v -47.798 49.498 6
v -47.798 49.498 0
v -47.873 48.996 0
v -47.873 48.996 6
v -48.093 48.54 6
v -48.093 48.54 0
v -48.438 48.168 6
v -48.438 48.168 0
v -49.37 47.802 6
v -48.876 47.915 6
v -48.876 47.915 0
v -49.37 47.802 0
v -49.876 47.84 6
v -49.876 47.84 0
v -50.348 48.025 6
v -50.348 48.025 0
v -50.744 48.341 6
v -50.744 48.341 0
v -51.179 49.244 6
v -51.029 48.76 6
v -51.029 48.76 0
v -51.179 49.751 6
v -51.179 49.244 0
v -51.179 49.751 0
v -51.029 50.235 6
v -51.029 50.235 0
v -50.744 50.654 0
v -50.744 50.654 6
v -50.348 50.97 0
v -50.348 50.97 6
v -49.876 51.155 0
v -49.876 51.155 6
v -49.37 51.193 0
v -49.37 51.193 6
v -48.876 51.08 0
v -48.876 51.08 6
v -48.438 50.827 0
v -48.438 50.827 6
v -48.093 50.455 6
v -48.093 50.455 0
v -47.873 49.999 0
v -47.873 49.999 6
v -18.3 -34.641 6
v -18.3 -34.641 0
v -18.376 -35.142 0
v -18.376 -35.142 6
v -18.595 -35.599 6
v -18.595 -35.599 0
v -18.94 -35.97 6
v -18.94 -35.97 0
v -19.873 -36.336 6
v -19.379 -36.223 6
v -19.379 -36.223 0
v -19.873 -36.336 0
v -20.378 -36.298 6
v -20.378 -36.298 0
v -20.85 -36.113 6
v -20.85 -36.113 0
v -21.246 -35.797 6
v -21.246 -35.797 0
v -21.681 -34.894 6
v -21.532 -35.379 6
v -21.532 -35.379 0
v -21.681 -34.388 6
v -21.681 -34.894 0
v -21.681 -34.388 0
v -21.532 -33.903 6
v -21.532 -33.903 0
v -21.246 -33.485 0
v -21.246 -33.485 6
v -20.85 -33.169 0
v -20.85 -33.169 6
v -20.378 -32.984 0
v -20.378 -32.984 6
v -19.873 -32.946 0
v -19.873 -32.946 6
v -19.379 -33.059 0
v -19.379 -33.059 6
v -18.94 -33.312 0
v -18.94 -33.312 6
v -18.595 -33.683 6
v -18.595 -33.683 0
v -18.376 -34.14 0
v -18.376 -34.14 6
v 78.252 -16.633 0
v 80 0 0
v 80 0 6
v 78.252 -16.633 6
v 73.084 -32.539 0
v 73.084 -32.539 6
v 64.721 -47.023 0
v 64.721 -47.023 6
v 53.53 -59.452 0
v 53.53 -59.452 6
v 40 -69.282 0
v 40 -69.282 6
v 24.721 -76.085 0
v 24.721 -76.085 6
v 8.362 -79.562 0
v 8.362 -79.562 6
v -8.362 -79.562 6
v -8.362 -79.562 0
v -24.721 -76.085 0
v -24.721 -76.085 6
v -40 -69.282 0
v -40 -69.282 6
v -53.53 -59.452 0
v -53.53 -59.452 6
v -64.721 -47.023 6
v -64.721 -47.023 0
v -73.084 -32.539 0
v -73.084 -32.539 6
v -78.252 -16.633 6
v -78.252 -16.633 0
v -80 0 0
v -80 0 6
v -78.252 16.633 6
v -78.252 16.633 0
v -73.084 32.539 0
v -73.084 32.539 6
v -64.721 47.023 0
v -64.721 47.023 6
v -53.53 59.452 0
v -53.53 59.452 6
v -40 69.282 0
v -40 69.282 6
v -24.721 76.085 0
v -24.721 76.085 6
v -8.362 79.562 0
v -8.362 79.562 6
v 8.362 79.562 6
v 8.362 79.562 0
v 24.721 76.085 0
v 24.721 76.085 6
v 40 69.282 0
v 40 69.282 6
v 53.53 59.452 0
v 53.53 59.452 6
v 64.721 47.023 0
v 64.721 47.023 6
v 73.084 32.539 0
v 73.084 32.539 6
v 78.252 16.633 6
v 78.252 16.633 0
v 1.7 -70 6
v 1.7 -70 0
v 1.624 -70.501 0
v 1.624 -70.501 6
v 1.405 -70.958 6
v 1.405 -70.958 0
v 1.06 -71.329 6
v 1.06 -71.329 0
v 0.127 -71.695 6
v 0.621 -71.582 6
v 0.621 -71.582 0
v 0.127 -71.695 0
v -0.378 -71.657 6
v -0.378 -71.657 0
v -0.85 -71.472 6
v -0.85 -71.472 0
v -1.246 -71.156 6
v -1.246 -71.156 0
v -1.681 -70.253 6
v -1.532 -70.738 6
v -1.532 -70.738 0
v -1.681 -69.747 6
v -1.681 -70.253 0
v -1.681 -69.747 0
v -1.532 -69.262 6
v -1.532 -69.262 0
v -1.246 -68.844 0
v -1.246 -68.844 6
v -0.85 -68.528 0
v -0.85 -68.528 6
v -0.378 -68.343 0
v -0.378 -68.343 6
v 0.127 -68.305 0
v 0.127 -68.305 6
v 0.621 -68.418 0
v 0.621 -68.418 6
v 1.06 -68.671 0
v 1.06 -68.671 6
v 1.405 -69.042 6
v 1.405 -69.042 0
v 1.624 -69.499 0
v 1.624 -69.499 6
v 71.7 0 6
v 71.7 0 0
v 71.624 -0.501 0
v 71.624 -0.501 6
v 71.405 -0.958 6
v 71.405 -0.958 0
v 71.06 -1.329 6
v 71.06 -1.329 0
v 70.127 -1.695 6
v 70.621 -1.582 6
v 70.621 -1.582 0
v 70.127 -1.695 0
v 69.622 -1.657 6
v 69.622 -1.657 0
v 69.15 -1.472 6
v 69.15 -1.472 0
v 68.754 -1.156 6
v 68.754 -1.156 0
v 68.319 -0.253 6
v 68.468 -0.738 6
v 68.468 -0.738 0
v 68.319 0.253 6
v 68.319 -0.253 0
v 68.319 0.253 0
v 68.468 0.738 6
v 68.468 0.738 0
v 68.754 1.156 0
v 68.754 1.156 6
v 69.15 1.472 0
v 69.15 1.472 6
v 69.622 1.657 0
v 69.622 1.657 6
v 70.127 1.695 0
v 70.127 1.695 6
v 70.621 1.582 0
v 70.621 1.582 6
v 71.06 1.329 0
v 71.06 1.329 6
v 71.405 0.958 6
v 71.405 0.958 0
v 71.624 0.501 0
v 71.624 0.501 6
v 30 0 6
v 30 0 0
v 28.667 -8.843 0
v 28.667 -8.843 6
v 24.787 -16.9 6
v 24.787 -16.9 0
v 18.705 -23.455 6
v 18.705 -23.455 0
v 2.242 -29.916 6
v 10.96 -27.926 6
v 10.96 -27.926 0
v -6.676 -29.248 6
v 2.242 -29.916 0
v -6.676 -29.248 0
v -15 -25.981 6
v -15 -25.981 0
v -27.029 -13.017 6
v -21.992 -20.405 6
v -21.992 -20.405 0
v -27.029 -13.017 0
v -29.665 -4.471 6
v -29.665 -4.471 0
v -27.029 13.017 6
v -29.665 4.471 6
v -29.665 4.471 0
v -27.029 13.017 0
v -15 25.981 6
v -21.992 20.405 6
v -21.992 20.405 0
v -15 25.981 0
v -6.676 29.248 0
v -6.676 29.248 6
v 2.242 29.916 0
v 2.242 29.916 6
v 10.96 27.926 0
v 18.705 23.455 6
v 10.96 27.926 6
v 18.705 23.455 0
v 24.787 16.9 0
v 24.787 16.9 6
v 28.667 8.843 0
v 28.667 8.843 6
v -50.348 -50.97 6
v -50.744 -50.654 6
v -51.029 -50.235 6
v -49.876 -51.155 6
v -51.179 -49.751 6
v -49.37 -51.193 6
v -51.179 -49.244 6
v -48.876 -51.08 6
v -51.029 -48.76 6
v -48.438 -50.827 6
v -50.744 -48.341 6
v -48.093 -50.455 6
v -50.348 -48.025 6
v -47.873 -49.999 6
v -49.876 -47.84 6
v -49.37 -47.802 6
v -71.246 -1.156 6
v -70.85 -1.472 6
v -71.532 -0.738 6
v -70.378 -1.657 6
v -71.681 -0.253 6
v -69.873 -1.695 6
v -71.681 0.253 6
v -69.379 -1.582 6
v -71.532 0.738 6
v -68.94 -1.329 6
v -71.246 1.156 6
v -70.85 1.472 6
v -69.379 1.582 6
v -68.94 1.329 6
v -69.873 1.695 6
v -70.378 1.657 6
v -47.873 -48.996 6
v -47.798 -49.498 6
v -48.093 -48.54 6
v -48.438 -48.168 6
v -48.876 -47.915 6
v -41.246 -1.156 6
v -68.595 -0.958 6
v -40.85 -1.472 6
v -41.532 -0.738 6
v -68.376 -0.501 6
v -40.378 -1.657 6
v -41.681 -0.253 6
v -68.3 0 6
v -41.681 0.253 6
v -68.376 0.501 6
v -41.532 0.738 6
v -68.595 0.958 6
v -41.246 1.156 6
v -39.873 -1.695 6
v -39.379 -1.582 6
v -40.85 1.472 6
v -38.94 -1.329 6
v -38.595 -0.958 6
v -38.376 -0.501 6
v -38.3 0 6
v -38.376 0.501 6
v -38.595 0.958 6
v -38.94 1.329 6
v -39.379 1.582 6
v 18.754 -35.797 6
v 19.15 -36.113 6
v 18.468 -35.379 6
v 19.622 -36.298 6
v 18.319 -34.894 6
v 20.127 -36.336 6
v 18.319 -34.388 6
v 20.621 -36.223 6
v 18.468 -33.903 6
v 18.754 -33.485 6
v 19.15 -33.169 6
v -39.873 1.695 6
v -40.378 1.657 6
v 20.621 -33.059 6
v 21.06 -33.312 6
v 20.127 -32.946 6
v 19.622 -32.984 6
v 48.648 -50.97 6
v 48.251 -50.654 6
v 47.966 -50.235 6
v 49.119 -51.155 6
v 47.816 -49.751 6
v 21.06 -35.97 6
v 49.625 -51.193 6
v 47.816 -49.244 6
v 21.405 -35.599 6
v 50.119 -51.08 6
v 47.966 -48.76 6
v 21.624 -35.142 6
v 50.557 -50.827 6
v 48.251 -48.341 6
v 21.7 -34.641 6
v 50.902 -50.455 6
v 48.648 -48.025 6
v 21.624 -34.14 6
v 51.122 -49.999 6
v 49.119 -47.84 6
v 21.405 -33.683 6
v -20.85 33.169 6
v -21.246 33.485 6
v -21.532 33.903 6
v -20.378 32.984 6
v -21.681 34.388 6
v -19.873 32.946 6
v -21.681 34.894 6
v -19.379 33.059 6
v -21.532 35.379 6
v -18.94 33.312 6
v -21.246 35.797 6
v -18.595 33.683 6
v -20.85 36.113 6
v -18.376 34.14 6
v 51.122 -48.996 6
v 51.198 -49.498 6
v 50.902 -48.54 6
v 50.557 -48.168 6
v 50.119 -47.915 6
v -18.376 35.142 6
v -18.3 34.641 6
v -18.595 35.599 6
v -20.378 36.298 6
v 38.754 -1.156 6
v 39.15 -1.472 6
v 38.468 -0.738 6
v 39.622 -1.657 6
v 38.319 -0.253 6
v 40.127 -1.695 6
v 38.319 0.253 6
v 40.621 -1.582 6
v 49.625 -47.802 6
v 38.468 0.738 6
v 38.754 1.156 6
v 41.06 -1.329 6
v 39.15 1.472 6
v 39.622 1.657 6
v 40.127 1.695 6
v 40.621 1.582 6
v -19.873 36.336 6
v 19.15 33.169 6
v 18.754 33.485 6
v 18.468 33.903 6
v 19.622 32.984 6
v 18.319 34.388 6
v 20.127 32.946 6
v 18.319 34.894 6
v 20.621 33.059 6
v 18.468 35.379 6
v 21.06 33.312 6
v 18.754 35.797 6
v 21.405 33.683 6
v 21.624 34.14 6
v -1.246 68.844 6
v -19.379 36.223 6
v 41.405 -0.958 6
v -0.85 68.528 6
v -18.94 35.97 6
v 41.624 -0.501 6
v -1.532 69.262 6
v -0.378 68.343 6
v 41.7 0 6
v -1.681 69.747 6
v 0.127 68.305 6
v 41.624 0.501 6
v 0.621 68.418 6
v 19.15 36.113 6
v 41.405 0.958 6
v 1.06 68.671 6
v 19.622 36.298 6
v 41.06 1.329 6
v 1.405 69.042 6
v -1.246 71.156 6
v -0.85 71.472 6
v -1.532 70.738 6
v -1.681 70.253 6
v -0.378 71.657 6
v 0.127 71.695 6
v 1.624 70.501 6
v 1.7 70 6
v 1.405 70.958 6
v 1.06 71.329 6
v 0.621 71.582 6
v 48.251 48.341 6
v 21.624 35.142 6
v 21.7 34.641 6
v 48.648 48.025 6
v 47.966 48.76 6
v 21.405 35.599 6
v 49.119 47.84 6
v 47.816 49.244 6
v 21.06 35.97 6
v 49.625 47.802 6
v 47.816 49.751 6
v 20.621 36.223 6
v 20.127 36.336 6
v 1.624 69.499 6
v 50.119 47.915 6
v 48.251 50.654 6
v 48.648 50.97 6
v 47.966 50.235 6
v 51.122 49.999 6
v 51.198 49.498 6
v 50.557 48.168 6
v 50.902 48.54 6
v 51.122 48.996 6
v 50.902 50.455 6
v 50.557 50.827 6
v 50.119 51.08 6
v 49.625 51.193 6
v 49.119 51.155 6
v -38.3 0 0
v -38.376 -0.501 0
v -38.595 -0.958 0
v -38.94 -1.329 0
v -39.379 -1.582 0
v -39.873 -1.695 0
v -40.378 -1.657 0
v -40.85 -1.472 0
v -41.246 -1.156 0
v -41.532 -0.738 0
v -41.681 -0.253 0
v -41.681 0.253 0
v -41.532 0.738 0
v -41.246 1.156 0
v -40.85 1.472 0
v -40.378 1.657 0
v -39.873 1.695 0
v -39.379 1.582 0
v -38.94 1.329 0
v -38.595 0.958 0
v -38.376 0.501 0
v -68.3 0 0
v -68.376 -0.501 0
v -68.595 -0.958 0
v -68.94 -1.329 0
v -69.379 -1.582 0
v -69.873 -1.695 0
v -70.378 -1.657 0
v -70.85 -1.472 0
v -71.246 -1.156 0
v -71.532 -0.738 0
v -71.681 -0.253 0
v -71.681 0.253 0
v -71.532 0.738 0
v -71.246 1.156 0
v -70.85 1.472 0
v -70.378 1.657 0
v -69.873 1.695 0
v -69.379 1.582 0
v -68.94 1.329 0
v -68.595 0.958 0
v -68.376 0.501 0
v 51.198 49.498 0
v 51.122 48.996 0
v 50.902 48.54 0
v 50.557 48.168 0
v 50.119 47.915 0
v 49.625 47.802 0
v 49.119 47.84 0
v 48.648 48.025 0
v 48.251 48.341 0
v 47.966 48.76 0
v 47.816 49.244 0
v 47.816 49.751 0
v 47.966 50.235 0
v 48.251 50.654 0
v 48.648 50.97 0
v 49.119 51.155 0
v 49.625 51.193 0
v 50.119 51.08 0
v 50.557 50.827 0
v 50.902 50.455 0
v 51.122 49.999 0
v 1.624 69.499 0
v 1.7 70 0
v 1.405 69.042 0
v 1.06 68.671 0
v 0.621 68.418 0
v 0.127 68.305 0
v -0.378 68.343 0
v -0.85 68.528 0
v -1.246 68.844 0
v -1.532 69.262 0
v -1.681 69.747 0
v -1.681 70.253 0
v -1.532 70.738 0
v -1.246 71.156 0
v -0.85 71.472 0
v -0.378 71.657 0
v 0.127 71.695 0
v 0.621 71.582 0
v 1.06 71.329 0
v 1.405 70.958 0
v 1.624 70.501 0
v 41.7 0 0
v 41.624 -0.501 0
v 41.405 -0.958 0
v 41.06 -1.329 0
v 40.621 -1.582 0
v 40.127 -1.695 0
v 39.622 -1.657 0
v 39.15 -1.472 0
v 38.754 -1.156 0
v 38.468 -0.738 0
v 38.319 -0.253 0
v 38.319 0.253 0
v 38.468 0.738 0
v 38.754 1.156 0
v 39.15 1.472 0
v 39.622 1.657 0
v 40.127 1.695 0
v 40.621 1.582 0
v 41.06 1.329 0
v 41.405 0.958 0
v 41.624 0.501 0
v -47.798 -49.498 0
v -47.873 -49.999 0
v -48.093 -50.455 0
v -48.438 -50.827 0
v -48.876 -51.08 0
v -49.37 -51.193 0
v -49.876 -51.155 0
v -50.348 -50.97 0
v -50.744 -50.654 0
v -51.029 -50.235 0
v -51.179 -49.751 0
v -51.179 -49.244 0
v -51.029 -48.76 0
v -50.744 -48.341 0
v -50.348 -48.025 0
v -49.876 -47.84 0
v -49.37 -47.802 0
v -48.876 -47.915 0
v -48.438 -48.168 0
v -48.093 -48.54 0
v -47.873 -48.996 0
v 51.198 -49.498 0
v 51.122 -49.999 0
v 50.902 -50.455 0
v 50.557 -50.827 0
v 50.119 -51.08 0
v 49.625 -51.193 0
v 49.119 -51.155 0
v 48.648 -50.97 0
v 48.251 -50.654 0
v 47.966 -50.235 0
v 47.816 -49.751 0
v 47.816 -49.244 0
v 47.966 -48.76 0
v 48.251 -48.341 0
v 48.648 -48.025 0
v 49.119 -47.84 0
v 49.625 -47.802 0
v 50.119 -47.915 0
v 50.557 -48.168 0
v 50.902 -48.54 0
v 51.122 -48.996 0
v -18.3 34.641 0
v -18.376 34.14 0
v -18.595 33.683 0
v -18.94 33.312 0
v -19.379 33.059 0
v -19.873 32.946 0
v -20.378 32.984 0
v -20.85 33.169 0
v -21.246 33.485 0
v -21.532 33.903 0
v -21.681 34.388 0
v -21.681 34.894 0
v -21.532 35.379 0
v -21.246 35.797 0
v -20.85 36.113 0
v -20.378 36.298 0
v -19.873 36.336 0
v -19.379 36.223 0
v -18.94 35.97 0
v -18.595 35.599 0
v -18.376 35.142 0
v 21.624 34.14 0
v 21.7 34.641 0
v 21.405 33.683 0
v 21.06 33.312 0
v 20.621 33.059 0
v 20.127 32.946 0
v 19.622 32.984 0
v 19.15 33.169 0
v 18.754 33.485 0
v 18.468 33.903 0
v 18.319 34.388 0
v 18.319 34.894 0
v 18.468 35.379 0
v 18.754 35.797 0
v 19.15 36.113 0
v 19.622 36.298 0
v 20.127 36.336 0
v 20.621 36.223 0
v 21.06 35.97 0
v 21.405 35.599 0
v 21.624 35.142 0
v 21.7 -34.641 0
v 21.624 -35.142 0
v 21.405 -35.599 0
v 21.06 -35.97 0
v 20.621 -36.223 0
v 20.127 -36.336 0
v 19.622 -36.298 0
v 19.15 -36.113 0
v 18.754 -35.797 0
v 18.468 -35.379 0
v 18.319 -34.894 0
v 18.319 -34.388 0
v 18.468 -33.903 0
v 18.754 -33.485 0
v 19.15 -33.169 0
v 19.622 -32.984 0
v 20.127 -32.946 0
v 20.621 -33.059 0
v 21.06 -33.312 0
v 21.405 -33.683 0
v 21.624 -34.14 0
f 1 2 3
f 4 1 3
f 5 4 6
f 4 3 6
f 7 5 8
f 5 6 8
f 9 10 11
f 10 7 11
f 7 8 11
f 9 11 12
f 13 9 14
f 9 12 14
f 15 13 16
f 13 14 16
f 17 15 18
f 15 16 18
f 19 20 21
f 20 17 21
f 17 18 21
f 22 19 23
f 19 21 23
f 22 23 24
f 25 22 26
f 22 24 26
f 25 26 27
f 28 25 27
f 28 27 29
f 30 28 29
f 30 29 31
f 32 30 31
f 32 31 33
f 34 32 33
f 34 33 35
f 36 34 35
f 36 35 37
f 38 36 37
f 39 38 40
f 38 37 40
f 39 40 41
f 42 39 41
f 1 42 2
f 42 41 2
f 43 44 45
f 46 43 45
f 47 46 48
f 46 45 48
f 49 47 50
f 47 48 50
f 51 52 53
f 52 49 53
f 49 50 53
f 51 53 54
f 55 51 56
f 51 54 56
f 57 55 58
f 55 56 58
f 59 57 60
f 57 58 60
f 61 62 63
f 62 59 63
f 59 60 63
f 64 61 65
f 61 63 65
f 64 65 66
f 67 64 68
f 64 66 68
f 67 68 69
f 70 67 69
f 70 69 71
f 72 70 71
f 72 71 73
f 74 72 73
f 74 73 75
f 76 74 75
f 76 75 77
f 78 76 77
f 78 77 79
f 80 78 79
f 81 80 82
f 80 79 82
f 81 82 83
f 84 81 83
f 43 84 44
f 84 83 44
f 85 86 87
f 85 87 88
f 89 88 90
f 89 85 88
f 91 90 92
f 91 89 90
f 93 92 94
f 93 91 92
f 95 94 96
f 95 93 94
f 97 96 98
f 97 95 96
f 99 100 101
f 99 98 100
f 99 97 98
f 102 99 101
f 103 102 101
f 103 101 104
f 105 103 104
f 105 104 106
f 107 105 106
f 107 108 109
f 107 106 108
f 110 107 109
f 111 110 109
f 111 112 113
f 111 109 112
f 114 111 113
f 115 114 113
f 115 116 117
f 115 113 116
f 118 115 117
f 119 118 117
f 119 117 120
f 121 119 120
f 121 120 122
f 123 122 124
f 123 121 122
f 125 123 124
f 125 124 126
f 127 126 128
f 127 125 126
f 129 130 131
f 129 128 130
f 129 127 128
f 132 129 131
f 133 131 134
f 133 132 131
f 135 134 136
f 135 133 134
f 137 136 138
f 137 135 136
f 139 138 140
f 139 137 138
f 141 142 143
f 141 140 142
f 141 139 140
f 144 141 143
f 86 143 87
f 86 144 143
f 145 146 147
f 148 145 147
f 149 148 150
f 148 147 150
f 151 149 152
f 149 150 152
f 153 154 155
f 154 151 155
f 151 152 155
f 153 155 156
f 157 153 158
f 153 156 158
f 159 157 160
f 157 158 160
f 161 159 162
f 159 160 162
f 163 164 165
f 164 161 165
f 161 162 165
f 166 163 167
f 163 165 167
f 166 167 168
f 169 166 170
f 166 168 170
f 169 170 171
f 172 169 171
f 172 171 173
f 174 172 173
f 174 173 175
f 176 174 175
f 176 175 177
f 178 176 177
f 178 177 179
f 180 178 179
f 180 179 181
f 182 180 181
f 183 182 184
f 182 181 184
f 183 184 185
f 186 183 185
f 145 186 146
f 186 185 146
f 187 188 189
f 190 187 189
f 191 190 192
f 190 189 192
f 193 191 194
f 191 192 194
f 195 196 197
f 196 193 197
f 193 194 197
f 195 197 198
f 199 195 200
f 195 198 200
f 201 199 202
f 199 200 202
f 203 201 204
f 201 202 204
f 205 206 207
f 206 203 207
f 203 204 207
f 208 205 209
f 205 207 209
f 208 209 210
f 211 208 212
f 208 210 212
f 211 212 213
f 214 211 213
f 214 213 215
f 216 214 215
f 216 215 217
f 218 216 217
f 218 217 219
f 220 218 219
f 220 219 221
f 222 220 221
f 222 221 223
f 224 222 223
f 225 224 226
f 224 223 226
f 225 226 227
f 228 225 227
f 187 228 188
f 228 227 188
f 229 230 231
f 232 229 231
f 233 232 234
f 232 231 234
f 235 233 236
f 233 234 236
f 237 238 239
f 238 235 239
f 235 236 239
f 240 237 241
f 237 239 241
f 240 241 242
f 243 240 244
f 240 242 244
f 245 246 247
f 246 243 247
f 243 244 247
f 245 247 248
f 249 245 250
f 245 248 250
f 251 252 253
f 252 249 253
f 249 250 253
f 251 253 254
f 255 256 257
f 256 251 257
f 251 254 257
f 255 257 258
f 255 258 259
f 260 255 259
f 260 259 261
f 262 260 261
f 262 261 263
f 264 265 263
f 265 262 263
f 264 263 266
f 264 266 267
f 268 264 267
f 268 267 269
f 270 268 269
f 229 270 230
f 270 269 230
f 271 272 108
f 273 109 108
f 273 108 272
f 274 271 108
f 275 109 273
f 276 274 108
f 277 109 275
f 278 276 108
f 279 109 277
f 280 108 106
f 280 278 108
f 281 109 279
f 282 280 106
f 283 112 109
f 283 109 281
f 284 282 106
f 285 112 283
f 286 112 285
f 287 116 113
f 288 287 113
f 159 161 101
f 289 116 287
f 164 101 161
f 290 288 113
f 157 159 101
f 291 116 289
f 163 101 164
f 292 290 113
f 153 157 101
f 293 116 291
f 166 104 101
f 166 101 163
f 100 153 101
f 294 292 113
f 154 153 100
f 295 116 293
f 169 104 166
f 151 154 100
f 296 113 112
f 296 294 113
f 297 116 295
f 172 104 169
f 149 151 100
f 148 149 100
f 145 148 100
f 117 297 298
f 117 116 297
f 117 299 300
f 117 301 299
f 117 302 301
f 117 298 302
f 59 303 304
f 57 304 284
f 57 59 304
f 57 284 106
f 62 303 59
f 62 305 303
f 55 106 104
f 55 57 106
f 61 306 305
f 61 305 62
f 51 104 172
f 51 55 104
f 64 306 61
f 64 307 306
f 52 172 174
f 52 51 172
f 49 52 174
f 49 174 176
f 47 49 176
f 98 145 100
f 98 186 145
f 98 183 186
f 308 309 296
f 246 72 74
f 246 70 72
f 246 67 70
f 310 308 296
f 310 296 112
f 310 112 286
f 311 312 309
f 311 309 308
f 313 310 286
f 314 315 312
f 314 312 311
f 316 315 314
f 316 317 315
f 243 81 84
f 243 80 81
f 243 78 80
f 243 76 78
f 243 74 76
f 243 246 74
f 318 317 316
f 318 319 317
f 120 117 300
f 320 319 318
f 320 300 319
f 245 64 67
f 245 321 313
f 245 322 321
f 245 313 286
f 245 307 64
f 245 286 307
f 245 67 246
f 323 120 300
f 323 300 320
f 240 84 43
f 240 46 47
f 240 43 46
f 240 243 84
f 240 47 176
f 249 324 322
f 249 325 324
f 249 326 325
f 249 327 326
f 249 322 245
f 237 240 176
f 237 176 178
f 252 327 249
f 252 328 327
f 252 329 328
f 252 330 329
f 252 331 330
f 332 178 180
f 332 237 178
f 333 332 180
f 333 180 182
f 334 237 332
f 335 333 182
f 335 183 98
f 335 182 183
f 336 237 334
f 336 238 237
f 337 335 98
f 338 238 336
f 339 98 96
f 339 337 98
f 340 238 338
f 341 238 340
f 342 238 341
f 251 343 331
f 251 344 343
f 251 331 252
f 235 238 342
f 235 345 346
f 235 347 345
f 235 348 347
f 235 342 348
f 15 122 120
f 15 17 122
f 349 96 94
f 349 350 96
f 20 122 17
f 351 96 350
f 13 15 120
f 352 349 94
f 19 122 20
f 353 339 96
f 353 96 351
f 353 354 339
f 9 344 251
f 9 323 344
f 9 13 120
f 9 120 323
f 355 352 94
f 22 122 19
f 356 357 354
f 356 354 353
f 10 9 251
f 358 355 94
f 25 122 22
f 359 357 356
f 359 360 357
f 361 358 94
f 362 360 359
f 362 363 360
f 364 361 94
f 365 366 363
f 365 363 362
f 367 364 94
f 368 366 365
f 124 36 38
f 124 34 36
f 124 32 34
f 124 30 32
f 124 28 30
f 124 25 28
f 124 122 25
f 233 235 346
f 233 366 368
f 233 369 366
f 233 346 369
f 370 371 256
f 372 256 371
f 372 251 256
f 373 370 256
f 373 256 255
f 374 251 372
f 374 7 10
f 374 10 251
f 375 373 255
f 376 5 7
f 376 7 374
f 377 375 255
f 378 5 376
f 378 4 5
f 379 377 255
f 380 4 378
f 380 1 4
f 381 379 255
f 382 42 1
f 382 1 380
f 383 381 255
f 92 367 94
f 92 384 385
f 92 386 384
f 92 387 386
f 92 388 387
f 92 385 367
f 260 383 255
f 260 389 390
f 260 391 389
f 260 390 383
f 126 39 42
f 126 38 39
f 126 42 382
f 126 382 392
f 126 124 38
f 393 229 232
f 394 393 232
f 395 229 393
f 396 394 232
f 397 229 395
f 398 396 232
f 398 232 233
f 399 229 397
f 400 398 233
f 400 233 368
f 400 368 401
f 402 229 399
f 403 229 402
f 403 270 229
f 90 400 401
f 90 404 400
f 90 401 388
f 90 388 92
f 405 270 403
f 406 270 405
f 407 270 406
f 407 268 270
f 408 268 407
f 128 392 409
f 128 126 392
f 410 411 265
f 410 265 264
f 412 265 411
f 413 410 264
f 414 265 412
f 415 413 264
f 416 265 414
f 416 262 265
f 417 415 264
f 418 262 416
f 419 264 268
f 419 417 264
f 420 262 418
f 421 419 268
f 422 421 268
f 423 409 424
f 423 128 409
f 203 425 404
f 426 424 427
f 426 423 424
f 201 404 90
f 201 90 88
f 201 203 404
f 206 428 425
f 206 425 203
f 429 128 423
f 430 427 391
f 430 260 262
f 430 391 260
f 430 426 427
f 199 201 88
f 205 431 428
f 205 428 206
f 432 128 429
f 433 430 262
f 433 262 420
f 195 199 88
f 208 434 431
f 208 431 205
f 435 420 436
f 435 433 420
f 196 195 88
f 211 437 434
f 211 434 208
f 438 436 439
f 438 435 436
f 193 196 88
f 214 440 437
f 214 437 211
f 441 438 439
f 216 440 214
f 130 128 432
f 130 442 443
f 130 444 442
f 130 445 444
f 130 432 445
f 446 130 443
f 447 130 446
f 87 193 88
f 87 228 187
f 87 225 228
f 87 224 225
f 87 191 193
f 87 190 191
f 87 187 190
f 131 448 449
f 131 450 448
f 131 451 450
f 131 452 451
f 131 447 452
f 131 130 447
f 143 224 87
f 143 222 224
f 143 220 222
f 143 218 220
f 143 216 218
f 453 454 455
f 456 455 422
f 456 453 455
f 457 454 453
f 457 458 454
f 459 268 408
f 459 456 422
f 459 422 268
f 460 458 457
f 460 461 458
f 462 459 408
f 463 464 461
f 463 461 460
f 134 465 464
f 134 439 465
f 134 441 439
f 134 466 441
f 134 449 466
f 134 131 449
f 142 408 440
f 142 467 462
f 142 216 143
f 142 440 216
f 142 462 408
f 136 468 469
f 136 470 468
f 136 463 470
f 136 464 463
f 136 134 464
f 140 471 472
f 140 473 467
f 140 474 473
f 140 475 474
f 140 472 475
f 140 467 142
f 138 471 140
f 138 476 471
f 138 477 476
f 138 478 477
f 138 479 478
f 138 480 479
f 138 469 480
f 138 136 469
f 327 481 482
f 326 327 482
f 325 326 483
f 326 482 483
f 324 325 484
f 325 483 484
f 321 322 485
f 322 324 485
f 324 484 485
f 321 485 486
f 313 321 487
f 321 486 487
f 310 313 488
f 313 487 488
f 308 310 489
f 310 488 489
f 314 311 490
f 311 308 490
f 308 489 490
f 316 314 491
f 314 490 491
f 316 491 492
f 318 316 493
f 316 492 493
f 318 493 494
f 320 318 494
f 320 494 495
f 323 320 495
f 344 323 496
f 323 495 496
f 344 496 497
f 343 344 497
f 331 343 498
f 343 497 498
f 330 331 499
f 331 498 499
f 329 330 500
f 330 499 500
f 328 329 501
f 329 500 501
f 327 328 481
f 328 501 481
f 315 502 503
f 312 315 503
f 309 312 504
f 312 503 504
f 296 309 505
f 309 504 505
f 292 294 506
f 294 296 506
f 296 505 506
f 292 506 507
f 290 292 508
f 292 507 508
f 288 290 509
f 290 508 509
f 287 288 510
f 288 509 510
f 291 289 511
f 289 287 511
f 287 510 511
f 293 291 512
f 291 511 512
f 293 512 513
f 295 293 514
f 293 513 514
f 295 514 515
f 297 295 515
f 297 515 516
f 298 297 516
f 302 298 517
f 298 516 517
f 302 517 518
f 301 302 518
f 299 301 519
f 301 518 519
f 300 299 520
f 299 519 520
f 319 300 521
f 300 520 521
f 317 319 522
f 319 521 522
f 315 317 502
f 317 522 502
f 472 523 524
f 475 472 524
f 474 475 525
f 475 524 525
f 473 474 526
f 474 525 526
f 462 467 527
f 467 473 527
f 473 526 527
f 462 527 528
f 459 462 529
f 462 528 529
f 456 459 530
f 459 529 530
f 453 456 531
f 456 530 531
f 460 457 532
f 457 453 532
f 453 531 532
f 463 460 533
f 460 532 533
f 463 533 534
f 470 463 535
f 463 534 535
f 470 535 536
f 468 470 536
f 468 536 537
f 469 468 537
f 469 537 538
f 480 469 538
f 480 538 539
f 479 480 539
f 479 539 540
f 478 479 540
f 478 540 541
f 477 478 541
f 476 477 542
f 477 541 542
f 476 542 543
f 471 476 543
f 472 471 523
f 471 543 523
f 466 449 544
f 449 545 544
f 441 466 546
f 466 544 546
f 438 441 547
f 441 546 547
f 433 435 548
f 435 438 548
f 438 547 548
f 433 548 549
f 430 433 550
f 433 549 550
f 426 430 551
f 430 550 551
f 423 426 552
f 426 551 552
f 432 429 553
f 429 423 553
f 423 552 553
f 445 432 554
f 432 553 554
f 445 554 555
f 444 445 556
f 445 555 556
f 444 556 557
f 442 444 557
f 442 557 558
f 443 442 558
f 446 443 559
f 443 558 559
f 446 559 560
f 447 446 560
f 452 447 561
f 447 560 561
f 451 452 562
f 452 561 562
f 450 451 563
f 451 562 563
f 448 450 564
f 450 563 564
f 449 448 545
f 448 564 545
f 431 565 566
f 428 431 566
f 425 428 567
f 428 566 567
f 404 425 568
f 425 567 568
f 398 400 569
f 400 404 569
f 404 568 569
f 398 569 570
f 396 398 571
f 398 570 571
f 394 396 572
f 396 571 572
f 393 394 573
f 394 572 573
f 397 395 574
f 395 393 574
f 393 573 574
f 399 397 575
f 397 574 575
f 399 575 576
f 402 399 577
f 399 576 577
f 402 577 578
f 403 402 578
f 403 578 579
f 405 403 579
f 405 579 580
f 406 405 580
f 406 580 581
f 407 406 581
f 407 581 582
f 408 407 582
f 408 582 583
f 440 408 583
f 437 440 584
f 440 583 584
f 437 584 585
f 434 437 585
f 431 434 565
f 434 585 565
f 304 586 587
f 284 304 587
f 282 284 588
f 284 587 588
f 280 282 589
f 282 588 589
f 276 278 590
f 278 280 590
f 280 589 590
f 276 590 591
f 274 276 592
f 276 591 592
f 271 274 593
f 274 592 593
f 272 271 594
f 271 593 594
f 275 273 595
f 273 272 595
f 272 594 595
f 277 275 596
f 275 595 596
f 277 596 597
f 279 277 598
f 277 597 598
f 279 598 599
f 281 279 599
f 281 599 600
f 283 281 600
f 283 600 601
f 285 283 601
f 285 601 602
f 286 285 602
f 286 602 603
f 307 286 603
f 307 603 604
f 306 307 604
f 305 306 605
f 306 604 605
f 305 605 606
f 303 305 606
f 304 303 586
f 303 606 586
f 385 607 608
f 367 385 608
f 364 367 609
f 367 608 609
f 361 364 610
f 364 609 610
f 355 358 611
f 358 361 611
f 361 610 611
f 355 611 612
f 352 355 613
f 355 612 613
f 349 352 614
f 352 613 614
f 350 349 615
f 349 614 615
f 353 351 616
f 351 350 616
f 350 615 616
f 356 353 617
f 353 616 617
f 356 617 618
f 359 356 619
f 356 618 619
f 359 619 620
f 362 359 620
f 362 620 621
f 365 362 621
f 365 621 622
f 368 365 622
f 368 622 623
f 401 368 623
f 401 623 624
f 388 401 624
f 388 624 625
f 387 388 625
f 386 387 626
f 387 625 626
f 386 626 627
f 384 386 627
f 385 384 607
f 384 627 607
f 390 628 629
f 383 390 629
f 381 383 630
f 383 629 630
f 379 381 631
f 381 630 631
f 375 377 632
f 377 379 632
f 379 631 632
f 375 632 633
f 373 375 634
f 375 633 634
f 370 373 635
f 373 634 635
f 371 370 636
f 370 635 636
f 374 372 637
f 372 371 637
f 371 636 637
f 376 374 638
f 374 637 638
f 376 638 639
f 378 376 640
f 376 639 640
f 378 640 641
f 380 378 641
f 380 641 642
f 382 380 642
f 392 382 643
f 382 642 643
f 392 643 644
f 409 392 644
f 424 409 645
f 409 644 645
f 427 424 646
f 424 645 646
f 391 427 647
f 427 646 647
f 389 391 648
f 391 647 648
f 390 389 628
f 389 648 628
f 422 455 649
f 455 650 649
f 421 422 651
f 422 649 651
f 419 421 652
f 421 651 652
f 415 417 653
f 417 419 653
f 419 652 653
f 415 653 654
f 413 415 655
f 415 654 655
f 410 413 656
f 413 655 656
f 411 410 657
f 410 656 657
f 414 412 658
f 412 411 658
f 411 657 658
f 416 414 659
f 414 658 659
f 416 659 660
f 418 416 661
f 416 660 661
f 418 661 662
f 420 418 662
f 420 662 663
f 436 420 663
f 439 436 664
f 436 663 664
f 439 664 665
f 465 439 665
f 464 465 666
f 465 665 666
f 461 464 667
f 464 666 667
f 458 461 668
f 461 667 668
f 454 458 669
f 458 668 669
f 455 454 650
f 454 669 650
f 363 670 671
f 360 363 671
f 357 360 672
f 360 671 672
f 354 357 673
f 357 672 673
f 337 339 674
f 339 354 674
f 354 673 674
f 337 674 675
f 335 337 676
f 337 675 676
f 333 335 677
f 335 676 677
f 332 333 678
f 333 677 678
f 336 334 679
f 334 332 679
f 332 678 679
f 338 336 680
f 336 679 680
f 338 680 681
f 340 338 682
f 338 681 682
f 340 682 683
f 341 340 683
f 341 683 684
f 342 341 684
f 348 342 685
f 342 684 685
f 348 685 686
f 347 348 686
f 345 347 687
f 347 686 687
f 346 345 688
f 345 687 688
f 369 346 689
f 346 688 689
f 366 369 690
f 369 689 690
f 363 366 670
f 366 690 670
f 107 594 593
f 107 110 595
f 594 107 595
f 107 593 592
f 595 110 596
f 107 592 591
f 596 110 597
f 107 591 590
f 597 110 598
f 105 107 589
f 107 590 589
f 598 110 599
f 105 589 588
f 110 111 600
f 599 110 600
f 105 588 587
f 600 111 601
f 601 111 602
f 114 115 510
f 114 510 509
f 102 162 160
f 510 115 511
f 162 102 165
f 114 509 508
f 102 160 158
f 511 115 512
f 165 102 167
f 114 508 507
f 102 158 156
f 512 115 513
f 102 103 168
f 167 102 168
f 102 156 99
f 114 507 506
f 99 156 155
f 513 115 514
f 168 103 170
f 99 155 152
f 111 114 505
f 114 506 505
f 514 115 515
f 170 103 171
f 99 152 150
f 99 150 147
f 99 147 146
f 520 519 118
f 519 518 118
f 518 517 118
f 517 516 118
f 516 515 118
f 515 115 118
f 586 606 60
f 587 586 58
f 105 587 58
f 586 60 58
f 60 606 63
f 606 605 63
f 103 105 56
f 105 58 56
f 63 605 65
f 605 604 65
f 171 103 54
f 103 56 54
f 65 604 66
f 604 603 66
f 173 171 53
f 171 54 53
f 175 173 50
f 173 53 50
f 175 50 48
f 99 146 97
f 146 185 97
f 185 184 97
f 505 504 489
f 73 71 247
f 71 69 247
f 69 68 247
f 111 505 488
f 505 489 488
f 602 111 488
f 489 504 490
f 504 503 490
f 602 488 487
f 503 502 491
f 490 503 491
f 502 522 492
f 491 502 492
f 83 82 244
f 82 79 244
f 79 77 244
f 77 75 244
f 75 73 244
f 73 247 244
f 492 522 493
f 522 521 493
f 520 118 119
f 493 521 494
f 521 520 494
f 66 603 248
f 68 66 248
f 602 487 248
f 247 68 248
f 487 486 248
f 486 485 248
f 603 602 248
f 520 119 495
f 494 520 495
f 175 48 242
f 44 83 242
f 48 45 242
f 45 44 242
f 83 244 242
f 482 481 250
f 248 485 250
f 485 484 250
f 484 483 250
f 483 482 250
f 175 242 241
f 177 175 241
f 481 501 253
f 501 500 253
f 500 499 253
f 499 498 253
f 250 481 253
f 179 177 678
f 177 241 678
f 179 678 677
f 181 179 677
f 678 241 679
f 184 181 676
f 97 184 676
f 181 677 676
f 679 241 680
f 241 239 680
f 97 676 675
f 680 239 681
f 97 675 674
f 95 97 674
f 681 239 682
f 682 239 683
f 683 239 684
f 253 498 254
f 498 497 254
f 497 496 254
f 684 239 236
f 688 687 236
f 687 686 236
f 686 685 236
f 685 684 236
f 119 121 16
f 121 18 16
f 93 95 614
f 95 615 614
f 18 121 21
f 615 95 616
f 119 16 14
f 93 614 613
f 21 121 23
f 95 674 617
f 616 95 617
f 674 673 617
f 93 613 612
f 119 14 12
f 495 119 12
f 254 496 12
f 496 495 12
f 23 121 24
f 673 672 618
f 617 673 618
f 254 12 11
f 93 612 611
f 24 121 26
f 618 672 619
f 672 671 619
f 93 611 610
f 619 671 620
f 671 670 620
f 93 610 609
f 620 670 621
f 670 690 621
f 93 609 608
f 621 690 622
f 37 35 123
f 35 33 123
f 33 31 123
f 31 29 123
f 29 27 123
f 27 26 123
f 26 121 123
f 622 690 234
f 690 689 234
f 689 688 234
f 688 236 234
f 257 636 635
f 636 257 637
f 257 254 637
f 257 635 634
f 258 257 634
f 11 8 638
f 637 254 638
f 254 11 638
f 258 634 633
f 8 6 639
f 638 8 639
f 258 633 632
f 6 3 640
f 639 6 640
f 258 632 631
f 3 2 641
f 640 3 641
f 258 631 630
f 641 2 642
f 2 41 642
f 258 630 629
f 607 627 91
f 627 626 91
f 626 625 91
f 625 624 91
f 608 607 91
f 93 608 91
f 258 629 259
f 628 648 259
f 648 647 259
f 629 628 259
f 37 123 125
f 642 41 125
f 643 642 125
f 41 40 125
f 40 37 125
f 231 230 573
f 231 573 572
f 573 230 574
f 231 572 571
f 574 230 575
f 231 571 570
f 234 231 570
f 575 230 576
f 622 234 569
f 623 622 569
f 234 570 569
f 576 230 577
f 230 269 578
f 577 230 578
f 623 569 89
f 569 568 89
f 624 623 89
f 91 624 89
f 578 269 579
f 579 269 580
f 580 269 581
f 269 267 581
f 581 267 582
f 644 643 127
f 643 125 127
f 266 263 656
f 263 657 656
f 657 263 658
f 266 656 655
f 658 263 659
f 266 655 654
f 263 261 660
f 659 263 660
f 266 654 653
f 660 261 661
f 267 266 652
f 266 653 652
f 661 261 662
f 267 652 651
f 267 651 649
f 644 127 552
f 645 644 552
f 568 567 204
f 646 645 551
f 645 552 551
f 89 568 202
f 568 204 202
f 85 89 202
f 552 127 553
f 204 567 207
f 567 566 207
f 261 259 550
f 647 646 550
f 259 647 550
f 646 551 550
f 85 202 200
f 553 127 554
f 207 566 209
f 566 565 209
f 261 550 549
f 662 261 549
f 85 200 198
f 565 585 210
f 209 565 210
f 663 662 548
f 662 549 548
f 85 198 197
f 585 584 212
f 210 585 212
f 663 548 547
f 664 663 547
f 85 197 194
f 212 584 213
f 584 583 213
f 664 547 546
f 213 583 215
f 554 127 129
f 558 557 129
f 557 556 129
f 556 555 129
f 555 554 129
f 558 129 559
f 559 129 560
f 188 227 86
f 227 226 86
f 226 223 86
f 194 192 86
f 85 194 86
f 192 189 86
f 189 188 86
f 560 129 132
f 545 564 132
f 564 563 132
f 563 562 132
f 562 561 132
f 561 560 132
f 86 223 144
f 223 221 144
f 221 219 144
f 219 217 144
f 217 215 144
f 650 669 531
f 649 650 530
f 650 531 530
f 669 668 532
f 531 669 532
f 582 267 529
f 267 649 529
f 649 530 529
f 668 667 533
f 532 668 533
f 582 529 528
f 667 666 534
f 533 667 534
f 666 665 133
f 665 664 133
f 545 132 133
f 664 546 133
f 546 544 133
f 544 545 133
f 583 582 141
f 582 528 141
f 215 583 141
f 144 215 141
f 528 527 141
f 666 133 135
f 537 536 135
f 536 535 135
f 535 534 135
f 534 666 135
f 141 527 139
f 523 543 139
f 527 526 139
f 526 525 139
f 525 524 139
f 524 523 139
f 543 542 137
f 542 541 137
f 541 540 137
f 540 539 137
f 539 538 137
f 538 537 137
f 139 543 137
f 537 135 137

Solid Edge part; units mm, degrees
sketch "Sketch1" plane through (0, 0, 0) normal (0, 0, 1) x (1, 0, 0)
  circle A0 centre (0, 0) radius 80
  circle A1 centre (0, 0) radius 30
  circle A2 centre (70, 0) radius 1.7
  circle A3 centre (49.4975, 49.4975) radius 1.7
  circle A4 centre (0, 70) radius 1.7
  circle A5 centre (-49.4975, 49.4975) radius 1.7
  circle A6 centre (-70, 0) radius 1.7
  circle A7 centre (-49.4975, -49.4975) radius 1.7
  circle A8 centre (0, -70) radius 1.7
  circle A9 centre (49.4975, -49.4975) radius 1.7
  circle A10 centre (40, 0) radius 1.7
  circle A11 centre (20, 34.641) radius 1.7
  circle A12 centre (-20, 34.641) radius 1.7
  circle A13 centre (-40, 0) radius 1.7
  circle A14 centre (-20, -34.641) radius 1.7
  circle A15 centre (20, -34.641) radius 1.7
extrude "Protrusion1" add sketch "Sketch1" along normal blind 6
